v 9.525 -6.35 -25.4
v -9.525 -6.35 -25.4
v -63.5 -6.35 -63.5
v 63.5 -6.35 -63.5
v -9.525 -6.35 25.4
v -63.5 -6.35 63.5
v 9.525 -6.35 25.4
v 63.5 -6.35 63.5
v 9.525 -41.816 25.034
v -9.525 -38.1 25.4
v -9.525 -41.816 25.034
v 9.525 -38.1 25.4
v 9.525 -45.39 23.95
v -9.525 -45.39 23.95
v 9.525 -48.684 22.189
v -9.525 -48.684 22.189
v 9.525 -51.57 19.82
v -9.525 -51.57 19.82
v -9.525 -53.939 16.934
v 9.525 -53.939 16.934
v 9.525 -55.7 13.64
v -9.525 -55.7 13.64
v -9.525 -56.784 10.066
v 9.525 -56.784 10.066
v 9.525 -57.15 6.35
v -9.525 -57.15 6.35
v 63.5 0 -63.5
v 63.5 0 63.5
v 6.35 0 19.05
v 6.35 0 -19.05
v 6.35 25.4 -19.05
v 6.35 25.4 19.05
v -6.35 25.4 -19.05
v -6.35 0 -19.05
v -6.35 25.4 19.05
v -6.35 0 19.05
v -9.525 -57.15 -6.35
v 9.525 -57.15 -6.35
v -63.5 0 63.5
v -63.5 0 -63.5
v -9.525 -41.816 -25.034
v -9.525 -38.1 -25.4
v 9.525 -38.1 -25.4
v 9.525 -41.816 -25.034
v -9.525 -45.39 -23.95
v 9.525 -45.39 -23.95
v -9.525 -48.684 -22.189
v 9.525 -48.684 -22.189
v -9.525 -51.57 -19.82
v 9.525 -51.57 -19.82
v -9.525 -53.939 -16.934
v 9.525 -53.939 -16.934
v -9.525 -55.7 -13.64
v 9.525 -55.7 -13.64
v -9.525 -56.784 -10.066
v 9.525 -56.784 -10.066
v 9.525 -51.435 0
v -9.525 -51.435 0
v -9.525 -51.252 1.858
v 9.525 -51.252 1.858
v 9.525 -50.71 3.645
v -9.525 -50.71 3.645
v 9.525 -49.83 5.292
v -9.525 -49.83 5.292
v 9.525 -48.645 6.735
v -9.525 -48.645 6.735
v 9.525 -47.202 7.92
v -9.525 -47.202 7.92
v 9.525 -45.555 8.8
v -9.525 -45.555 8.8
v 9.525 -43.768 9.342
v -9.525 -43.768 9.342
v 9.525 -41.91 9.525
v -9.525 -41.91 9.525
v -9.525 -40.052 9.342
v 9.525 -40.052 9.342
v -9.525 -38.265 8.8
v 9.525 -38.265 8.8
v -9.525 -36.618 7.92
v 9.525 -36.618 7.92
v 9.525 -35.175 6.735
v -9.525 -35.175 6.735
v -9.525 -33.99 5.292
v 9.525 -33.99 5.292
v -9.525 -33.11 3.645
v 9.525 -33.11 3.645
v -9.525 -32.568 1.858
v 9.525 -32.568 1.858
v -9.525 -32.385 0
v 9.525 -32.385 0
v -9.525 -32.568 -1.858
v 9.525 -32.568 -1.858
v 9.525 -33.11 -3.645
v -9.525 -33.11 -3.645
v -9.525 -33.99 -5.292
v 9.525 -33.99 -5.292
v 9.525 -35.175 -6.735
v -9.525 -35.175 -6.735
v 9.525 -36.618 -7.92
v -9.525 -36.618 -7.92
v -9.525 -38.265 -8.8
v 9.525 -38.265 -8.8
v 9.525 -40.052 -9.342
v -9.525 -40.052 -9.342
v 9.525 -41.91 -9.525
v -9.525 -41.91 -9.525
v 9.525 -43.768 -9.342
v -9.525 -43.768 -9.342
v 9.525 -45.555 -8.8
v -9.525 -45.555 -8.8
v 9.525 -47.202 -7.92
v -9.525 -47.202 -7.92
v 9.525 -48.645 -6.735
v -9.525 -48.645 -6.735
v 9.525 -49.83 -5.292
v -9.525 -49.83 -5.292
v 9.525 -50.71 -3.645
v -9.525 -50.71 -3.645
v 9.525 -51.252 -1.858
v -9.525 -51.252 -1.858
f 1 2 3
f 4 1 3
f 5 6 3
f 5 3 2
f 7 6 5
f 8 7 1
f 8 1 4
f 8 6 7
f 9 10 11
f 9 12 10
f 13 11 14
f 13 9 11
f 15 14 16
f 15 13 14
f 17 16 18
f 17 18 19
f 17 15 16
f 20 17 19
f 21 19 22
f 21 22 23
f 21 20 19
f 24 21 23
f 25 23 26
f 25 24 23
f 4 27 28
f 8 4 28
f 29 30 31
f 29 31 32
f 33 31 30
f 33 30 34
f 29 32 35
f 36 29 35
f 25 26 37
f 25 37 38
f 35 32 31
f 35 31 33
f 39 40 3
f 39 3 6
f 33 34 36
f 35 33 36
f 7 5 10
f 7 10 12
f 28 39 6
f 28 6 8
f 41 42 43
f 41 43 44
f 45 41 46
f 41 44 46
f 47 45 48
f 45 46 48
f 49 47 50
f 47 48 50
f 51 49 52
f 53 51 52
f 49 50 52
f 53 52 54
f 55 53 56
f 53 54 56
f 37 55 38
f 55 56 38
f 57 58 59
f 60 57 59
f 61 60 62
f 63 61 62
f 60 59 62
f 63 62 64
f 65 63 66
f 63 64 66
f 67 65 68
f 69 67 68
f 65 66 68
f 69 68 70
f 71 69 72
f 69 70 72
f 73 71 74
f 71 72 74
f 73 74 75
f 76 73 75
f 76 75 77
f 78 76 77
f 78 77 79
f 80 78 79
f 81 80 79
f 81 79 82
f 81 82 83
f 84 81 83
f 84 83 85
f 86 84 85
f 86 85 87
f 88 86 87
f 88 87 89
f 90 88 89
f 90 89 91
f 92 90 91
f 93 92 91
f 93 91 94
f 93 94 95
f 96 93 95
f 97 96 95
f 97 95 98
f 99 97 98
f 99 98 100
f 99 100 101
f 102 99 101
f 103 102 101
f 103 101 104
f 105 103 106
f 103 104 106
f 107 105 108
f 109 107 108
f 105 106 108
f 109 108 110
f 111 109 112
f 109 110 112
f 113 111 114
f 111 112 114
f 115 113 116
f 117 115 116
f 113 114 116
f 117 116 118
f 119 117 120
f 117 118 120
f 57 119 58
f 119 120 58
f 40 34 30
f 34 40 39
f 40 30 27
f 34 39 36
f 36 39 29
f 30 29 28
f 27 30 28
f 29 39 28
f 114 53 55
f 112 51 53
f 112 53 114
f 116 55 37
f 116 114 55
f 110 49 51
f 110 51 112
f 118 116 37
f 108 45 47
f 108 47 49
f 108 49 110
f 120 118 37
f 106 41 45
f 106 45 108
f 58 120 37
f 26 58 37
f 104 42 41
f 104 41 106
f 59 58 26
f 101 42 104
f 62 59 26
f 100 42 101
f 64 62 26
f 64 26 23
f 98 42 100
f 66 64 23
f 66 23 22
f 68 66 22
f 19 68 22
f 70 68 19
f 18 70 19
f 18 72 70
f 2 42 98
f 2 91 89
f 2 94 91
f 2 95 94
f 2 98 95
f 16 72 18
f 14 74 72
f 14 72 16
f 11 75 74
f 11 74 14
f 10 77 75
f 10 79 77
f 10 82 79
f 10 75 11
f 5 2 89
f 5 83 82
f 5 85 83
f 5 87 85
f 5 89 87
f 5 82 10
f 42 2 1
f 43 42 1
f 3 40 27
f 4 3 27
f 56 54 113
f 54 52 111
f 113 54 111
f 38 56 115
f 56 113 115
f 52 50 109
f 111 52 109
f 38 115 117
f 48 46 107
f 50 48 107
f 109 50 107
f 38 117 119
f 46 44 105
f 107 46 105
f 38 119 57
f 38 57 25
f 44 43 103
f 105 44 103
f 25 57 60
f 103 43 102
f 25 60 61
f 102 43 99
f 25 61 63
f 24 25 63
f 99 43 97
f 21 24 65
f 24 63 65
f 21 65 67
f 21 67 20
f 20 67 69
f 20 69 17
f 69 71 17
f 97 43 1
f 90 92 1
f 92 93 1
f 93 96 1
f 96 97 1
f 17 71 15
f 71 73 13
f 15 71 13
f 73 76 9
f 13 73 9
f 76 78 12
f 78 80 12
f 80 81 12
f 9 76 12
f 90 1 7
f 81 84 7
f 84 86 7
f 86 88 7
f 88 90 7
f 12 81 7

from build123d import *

# Parameters (mm, degrees)
F0_W     = 127
F0_H     = 127
F1_DEPTH = 6.35
F2_W     = 19.05
F2_H     = 50.8
F3_DEPTH = 50.8
F4_R     = 9.525
F5_DEPTH = 73.026
F6_W     = 12.7
F6_H     = 38.1
F7_DEPTH = 25.4
F8_R     = 19.05


with BuildPart() as f1:
    # F0 (on Front) → F1 (new body)
    with BuildSketch(Plane.XZ):
        Rectangle(F0_W, F0_H)
    extrude(amount=F1_DEPTH)

    # F2 (on face) → F3 (join)
    with BuildSketch(Plane.XZ.offset(6.35)):
        Rectangle(F2_W, F2_H)
    extrude(amount=F3_DEPTH)

    # F4 (on face) → F5 (cut, through all)
    with BuildSketch(Plane(origin=(-9.525, 0, 0), x_dir=(0, -1, 0), z_dir=(-1, 0, 0))):
        with Locations((41.91, 0)):
            Circle(F4_R)
    extrude(amount=-F5_DEPTH, mode=Mode.SUBTRACT)

    # F6 (on face) → F7 (join)
    with BuildSketch(Plane(origin=(0, 0, 0), x_dir=(-1, 0, 0), z_dir=(0, 1, 0))):
        Rectangle(F6_W, F6_H)
    extrude(amount=F7_DEPTH)

    # F8
    f8_edges = [f1.edges().sort_by_distance(p)[0] for p in [
        (0, -57.15, 25.4),
        (0, -57.15, -25.4),
    ]]
    fillet(f8_edges, radius=F8_R)


solid = f1.part
